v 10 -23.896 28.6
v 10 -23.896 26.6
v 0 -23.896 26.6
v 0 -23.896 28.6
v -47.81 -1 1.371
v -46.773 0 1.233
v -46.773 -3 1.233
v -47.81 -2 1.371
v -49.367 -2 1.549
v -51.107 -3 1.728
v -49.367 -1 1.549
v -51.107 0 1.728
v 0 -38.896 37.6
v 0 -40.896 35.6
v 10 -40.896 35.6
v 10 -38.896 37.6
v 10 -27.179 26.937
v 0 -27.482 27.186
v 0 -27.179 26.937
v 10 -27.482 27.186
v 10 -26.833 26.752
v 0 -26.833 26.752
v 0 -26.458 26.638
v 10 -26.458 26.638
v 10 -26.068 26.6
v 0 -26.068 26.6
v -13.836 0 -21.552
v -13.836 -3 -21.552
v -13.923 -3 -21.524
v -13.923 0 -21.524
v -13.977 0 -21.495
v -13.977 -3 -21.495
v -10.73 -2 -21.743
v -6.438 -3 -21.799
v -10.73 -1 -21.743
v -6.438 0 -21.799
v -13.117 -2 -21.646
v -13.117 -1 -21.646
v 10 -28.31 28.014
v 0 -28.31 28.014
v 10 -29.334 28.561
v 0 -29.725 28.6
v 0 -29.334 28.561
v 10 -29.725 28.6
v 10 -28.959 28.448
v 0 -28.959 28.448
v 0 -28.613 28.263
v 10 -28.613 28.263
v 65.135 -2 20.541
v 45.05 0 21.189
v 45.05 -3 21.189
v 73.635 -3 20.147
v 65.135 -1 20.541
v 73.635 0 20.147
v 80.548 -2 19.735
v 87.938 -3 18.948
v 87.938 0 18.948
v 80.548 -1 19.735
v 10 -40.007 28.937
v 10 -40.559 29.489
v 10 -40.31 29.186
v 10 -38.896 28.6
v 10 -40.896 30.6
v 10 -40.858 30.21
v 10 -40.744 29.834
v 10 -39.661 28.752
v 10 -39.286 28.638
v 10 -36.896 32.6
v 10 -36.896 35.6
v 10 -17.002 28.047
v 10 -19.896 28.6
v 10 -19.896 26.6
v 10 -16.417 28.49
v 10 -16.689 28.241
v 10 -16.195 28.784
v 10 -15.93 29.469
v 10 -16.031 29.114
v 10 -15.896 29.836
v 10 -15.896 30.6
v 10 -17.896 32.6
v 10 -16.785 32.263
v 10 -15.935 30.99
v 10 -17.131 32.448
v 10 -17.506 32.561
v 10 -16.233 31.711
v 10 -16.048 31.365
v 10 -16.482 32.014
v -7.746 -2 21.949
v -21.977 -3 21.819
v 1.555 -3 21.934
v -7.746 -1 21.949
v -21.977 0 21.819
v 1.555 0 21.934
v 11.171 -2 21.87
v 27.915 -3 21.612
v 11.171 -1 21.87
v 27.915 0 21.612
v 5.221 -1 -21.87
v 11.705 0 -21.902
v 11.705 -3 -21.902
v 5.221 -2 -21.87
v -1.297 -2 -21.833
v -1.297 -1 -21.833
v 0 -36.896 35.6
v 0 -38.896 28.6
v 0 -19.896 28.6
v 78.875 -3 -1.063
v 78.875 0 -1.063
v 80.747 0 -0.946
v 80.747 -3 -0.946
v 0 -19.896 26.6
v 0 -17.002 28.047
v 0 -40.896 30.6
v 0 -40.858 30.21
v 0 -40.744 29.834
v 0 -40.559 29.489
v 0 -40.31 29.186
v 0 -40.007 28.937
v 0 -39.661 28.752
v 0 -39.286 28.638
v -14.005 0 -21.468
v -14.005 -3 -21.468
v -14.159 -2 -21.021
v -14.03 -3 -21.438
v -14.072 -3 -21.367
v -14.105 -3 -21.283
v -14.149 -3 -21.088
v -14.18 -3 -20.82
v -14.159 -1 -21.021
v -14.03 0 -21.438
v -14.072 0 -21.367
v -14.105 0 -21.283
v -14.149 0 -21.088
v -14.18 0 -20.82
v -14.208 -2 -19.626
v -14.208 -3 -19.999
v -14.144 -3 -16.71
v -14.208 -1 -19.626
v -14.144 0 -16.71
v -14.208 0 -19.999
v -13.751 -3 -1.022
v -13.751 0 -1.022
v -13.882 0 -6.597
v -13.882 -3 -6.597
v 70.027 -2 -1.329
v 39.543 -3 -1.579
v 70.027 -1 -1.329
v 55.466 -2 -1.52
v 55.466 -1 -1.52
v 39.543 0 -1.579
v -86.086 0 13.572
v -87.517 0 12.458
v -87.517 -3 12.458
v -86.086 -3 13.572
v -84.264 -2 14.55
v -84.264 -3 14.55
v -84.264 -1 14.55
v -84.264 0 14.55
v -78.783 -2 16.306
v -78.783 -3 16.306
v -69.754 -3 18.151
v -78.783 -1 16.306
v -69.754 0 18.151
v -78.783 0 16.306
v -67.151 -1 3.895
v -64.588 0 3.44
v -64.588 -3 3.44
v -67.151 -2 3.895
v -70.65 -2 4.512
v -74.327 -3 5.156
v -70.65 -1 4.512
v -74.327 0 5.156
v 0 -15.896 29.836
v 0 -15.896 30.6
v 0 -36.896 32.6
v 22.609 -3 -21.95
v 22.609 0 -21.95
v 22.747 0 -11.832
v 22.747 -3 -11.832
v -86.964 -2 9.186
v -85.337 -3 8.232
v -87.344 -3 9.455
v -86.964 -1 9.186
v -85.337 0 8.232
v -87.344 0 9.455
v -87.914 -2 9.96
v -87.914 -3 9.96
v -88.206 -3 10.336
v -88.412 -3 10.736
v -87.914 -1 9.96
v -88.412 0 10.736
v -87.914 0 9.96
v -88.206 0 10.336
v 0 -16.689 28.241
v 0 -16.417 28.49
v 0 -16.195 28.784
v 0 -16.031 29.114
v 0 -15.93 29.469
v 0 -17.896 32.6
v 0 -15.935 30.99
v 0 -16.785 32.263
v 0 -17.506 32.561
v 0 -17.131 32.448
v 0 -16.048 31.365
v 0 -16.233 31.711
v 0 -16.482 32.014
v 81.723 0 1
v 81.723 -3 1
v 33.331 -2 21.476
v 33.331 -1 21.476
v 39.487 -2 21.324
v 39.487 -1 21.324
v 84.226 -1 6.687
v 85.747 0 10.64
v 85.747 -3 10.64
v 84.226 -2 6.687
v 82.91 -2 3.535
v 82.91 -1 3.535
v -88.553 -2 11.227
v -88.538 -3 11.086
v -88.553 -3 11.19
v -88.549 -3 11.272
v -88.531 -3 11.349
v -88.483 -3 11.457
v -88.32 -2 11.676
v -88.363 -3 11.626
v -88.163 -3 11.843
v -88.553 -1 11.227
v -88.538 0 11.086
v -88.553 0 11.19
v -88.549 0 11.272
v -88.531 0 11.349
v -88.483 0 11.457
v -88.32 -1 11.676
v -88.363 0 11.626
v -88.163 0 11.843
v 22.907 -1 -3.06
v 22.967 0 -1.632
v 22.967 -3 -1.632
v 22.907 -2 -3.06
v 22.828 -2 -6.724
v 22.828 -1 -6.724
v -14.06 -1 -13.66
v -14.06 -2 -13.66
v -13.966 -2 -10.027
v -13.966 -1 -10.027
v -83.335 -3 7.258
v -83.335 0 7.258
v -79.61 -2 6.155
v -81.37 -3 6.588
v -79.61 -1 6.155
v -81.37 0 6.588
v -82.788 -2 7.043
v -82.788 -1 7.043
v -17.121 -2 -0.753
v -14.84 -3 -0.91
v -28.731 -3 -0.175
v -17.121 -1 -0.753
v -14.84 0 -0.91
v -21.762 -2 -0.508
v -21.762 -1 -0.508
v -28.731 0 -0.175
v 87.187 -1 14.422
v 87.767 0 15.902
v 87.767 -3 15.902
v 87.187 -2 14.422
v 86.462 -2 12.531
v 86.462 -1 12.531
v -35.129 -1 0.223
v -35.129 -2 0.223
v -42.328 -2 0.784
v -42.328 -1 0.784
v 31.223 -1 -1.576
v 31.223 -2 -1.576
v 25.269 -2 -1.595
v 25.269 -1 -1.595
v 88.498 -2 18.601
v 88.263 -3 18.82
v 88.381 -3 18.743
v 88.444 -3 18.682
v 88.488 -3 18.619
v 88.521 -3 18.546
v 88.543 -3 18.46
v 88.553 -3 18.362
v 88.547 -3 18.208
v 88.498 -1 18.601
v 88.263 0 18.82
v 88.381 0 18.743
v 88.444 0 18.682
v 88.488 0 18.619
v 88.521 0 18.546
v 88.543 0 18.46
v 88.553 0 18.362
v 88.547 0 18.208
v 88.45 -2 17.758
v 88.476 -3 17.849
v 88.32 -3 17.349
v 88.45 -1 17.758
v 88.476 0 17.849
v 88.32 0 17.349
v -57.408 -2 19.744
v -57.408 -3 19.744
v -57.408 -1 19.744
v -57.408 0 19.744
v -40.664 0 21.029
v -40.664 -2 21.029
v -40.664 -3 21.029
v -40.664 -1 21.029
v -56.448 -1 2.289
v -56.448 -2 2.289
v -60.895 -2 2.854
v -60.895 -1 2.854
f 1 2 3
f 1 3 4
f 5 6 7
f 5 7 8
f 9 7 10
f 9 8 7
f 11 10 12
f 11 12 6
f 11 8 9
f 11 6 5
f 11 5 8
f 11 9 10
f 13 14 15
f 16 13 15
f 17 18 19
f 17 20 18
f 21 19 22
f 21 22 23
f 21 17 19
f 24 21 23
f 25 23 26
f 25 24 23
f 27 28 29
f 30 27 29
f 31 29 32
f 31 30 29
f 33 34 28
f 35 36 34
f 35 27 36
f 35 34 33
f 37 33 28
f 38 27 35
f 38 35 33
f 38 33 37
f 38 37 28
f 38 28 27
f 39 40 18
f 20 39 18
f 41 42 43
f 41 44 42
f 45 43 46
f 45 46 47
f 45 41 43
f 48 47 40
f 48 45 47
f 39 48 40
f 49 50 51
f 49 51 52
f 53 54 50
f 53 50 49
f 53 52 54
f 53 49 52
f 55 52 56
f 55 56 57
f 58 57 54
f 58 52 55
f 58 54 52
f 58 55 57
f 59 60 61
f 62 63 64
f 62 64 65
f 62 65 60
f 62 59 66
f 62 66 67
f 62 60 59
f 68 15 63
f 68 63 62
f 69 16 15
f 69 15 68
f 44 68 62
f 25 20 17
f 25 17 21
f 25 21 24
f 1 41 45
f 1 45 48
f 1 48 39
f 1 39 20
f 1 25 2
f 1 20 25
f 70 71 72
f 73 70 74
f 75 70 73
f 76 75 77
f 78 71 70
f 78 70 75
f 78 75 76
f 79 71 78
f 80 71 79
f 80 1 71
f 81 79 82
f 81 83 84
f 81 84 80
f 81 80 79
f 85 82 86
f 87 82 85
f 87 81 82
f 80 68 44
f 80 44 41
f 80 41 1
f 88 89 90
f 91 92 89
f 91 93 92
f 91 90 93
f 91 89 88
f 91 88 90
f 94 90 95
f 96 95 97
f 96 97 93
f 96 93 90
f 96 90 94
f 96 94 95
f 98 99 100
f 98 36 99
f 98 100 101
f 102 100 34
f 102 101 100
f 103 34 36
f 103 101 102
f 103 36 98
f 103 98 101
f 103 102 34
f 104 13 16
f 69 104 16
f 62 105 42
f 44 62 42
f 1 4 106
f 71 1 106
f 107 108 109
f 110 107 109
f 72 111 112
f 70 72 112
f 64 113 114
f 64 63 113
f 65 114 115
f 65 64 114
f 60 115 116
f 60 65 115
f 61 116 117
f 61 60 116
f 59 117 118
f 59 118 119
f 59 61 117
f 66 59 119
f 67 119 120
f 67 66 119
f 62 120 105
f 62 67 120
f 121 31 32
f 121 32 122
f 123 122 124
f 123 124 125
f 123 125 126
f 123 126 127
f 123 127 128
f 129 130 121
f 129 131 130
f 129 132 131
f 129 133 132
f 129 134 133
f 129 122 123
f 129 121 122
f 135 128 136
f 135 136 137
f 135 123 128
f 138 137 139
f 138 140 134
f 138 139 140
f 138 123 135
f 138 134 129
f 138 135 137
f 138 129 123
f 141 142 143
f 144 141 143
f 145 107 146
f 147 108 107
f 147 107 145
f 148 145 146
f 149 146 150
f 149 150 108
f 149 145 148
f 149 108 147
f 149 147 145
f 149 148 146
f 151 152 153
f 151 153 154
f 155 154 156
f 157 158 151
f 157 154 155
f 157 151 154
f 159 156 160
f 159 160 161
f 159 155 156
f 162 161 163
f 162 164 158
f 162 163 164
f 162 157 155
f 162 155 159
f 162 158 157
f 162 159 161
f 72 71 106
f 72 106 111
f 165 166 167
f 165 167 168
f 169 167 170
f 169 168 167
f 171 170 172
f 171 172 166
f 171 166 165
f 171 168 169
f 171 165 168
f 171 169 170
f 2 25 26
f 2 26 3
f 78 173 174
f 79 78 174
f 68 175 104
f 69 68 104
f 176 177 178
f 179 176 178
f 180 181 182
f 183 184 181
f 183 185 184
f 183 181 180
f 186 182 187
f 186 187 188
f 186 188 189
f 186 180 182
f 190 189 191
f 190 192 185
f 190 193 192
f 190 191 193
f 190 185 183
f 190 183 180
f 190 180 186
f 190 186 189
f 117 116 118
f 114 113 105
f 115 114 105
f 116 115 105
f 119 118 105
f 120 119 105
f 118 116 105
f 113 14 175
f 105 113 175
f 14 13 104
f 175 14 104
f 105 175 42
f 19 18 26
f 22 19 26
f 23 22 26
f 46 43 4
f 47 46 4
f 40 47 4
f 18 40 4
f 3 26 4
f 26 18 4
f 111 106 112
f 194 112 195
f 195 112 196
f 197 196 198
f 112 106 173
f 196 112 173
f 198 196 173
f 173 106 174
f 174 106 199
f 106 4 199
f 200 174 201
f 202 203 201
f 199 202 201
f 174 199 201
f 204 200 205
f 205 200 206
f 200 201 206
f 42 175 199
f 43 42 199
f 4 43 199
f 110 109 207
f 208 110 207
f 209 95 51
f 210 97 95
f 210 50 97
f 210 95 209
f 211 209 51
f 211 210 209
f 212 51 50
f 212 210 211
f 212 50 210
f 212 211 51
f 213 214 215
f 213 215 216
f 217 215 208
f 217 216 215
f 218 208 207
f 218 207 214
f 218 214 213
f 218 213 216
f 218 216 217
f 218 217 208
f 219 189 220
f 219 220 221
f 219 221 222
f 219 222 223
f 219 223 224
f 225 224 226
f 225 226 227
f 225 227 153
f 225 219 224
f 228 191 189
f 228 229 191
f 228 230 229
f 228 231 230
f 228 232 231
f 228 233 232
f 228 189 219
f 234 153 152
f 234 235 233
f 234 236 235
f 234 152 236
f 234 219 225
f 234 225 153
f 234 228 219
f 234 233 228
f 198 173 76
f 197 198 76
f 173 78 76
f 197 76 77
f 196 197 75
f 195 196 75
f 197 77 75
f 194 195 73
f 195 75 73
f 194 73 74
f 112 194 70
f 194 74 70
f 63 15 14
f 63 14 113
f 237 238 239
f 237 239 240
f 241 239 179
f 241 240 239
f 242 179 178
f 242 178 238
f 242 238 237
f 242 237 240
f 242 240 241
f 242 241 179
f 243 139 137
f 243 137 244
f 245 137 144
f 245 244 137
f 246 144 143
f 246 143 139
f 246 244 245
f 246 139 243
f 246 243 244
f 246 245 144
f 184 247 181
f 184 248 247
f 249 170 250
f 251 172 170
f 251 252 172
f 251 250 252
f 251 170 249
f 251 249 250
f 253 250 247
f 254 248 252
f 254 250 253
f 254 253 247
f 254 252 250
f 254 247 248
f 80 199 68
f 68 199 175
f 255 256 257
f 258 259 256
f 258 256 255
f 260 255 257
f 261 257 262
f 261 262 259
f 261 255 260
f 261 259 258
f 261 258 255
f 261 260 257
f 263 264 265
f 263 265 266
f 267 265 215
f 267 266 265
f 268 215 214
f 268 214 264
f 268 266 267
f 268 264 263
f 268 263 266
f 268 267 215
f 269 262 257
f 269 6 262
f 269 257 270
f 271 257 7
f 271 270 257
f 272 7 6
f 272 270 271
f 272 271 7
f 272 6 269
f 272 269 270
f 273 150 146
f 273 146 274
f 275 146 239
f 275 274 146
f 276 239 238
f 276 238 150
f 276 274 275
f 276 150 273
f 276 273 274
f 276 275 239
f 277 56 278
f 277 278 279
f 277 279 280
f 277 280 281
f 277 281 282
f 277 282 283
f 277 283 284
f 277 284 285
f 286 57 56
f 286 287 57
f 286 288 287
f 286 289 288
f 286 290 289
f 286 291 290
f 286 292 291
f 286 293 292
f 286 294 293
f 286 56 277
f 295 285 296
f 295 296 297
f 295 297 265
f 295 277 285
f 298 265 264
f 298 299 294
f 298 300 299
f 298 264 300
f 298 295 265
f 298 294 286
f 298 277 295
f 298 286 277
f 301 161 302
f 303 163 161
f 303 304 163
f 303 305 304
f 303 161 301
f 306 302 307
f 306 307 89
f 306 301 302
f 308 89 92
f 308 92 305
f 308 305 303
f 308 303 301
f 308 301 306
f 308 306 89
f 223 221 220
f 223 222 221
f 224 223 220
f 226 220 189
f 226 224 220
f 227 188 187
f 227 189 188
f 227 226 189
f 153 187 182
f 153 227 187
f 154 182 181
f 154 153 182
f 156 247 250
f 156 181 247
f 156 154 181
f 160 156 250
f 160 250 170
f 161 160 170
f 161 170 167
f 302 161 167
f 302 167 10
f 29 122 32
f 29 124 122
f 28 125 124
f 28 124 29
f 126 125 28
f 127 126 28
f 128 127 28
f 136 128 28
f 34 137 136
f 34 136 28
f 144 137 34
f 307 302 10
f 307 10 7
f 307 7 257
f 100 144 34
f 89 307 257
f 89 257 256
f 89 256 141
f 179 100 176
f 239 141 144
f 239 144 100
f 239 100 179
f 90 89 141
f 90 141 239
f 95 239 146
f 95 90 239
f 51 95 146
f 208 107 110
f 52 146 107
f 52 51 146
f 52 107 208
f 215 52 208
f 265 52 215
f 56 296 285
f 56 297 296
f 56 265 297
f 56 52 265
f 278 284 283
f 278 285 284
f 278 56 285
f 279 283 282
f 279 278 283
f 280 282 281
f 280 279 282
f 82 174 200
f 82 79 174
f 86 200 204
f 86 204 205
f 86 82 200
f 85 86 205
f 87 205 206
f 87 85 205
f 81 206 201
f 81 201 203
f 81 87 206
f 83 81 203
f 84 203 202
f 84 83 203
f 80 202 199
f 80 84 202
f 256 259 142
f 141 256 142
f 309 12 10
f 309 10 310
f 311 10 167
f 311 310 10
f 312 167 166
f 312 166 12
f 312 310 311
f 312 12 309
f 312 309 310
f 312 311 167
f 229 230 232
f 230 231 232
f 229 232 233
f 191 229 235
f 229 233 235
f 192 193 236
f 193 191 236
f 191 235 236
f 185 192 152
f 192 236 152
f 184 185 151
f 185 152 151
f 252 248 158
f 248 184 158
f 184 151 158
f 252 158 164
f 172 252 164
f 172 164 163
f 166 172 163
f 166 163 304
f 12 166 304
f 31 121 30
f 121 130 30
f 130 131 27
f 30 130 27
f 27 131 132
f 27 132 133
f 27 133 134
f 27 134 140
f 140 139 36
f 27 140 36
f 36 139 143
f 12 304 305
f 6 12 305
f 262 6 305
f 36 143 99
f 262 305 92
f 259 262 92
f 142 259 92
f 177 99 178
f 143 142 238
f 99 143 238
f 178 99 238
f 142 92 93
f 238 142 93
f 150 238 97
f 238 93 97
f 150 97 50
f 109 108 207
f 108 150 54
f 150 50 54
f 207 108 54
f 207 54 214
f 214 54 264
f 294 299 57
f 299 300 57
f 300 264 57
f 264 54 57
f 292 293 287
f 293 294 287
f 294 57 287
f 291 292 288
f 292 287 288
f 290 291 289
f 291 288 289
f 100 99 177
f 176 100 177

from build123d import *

# Parameters (mm, degrees)
F0_W     = 4
F0_H     = 5
F1_DEPTH = 10
F2_R     = 2
F3_SIZE  = 1.99999
F5_DEPTH = 3


# Not quite as in the source:
# - a fillet or chamfer is up to 0.001 mm smaller than in the source, because OpenCascade refuses the exact size


with BuildPart() as f1:
    # F0 (on Right) → F1 (new body)
    with BuildSketch(Plane.YZ):
        Polygon((-15.8961138576, 28.5998058021), (-15.8961138576, 32.5998058021), (-36.8961138576, 32.5998058021), (-40.8961138576, 32.5998058021), (-40.8961138576, 28.5998058021), (-28.8961138576, 28.5998058021), (-23.8961138576, 28.5998058021), (-19.8961138576, 28.5998058021), align=None)
        Polygon((-23.8961138576, 26.5998058021), (-23.8961138576, 28.5998058021), (-28.8961138576, 28.5998058021), (-26.8961138576, 26.5998058021), align=None)
        Polygon((-19.8961138576, 26.5998058021), (-15.8961138576, 28.5998058021), (-19.8961138576, 28.5998058021), align=None)
        with Locations((-38.8961138576, 35.0998058021)):
            Rectangle(F0_W, F0_H)
    extrude(amount=F1_DEPTH)

    # F2
    f2_edges = [f1.edges().sort_by_distance(p)[0] for p in [
        (5, -15.896114, 28.599806),
        (5, -26.896114, 26.599806),
        (5, -28.896114, 28.599806),
        (5, -40.896114, 28.599806),
        (5, -15.896114, 32.599806),
    ]]
    fillet(f2_edges, radius=F2_R)

    # F3 (size 2 in the source; OpenCascade refuses exactly that, so slightly less here)
    f3_edges = [f1.edges().sort_by_distance(p)[0] for p in [
        (5, -36.896114, 37.599806),
        (5, -40.896114, 37.599806),
    ]]
    chamfer(f3_edges, length=F3_SIZE)


with BuildPart() as f5:
    # F4 (on Front) → F5 (new body)
    with BuildSketch(Plane.XZ):
        with BuildLine():
            Line((-13.751079, -1.021588), (-13.881861, -6.597255))
            add(Edge.make_bspline(
                [(-14.144328, -16.709559), (-14.07191, -14.214404), (-13.9538, -9.663881), (-13.881861, -6.597255)],
                knots=[0, 0, 0, 0, 1, 1, 1, 1], degree=3))
            add(Edge.make_bspline(
                [(-13.976603, -21.494693), (-14.232522, -21.282293), (-14.256878, -20.58749), (-14.144328, -16.709559)],
                knots=[0, 0, 0, 0, 1, 1, 1, 1], degree=3))
            add(Edge.make_bspline(
                [(-6.437601, -21.79876), (-11.808741, -21.757499), (-13.754494, -21.679013), (-13.976603, -21.494693)],
                knots=[0, 0, 0, 0, 1, 1, 1, 1], degree=3))
            add(Edge.make_bspline(
                [(11.705422, -21.902138), (5.708538, -21.875891), (-2.45584, -21.829353), (-6.437601, -21.79876)],
                knots=[0, 0, 0, 0, 1, 1, 1, 1], degree=3))
            Line((11.705422, -21.902138), (22.608851, -21.949918))
            Line((22.608851, -21.949918), (22.747479, -11.831771))
            add(Edge.make_bspline(
                [(22.96733, -1.63243), (22.922682, -1.677105), (22.823735, -6.266801), (22.747479, -11.831771)],
                knots=[0, 0, 0, 0, 1, 1, 1, 1], degree=3))
            add(Edge.make_bspline(
                [(39.542721, -1.579231), (30.470942, -1.563709), (23.012006, -1.587697), (22.96733, -1.63243)],
                knots=[0, 0, 0, 0, 1, 1, 1, 1], degree=3))
            add(Edge.make_bspline(
                [(78.874564, -1.063216), (74.335359, -1.347272), (54.695232, -1.604969), (39.542721, -1.579231)],
                knots=[0, 0, 0, 0, 1, 1, 1, 1], degree=3))
            Line((78.874564, -1.063216), (80.747165, -0.946009))
            Line((80.747165, -0.946009), (81.723372, 1.000055))
            add(Edge.make_bspline(
                [(85.747268, 10.639524), (84.097425, 6.225766), (82.871029, 3.287861), (81.723372, 1.000055)],
                knots=[0, 0, 0, 0, 1, 1, 1, 1], degree=3))
            add(Edge.make_bspline(
                [(87.766907, 15.90215), (87.312416, 14.763496), (86.403576, 12.395313), (85.747268, 10.639524)],
                knots=[0, 0, 0, 0, 1, 1, 1, 1], degree=3))
            add(Edge.make_bspline(
                [(87.938103, 18.948005), (88.791769, 18.676253), (88.778278, 18.436026), (87.766907, 15.90215)],
                knots=[0, 0, 0, 0, 1, 1, 1, 1], degree=3))
            add(Edge.make_bspline(
                [(45.0504, 21.189104), (66.354481, 20.677689), (85.676176, 19.668039), (87.938103, 18.948005)],
                knots=[0, 0, 0, 0, 1, 1, 1, 1], degree=3))
            add(Edge.make_bspline(
                [(27.915476, 21.611873), (32.516714, 21.495117), (40.22742, 21.304871), (45.0504, 21.189104)],
                knots=[0, 0, 0, 0, 1, 1, 1, 1], degree=3))
            add(Edge.make_bspline(
                [(-21.977377, 21.818629), (-12.375105, 22.062694), (14.543589, 21.951132), (27.915476, 21.611873)],
                knots=[0, 0, 0, 0, 1, 1, 1, 1], degree=3))
            add(Edge.make_bspline(
                [(-69.753564, 18.150756), (-60.424959, 19.834465), (-40.817206, 21.339782), (-21.977377, 21.818629)],
                knots=[0, 0, 0, 0, 1, 1, 1, 1], degree=3))
            add(Edge.make_bspline(
                [(-87.516686, 12.458164), (-84.937485, 14.858859), (-80.998538, 16.121183), (-69.753564, 18.150756)],
                knots=[0, 0, 0, 0, 1, 1, 1, 1], degree=3))
            add(Edge.make_bspline(
                [(-88.412233, 10.73579), (-88.675914, 11.372427), (-88.669168, 11.385409), (-87.516686, 12.458164)],
                knots=[0, 0, 0, 0, 1, 1, 1, 1], degree=3))
            add(Edge.make_bspline(
                [(-85.337366, 8.232423), (-87.37628, 9.336899), (-88.065044, 9.897675), (-88.412233, 10.73579)],
                knots=[0, 0, 0, 0, 1, 1, 1, 1], degree=3))
            add(Edge.make_bspline(
                [(-74.326693, 5.15589), (-81.155143, 6.348674), (-82.610619, 6.755328), (-85.337366, 8.232423)],
                knots=[0, 0, 0, 0, 1, 1, 1, 1], degree=3))
            add(Edge.make_bspline(
                [(-64.587796, 3.439894), (-66.431131, 3.770037), (-70.813619, 4.542226), (-74.326693, 5.15589)],
                knots=[0, 0, 0, 0, 1, 1, 1, 1], degree=3))
            add(Edge.make_bspline(
                [(-51.106744, 1.728075), (-56.94022, 2.29362), (-61.22732, 2.837999), (-64.587796, 3.439894)],
                knots=[0, 0, 0, 0, 1, 1, 1, 1], degree=3))
            add(Edge.make_bspline(
                [(-46.7726, 1.23269), (-47.437855, 1.338552), (-49.388208, 1.561479), (-51.106744, 1.728075)],
                knots=[0, 0, 0, 0, 1, 1, 1, 1], degree=3))
            add(Edge.make_bspline(
                [(-28.73056, -0.174808), (-33.543126, 0.048034), (-44.890884, 0.933281), (-46.7726, 1.23269)],
                knots=[0, 0, 0, 0, 1, 1, 1, 1], degree=3))
            add(Edge.make_bspline(
                [(-14.840401, -0.91011), (-15.931302, -0.798463), (-20.608402, -0.550869), (-28.73056, -0.174808)],
                knots=[0, 0, 0, 0, 1, 1, 1, 1], degree=3))
            Line((-14.840401, -0.91011), (-13.751079, -1.021588))
        make_face()
    extrude(amount=F5_DEPTH)


solid = Compound([f1.part, f5.part])
